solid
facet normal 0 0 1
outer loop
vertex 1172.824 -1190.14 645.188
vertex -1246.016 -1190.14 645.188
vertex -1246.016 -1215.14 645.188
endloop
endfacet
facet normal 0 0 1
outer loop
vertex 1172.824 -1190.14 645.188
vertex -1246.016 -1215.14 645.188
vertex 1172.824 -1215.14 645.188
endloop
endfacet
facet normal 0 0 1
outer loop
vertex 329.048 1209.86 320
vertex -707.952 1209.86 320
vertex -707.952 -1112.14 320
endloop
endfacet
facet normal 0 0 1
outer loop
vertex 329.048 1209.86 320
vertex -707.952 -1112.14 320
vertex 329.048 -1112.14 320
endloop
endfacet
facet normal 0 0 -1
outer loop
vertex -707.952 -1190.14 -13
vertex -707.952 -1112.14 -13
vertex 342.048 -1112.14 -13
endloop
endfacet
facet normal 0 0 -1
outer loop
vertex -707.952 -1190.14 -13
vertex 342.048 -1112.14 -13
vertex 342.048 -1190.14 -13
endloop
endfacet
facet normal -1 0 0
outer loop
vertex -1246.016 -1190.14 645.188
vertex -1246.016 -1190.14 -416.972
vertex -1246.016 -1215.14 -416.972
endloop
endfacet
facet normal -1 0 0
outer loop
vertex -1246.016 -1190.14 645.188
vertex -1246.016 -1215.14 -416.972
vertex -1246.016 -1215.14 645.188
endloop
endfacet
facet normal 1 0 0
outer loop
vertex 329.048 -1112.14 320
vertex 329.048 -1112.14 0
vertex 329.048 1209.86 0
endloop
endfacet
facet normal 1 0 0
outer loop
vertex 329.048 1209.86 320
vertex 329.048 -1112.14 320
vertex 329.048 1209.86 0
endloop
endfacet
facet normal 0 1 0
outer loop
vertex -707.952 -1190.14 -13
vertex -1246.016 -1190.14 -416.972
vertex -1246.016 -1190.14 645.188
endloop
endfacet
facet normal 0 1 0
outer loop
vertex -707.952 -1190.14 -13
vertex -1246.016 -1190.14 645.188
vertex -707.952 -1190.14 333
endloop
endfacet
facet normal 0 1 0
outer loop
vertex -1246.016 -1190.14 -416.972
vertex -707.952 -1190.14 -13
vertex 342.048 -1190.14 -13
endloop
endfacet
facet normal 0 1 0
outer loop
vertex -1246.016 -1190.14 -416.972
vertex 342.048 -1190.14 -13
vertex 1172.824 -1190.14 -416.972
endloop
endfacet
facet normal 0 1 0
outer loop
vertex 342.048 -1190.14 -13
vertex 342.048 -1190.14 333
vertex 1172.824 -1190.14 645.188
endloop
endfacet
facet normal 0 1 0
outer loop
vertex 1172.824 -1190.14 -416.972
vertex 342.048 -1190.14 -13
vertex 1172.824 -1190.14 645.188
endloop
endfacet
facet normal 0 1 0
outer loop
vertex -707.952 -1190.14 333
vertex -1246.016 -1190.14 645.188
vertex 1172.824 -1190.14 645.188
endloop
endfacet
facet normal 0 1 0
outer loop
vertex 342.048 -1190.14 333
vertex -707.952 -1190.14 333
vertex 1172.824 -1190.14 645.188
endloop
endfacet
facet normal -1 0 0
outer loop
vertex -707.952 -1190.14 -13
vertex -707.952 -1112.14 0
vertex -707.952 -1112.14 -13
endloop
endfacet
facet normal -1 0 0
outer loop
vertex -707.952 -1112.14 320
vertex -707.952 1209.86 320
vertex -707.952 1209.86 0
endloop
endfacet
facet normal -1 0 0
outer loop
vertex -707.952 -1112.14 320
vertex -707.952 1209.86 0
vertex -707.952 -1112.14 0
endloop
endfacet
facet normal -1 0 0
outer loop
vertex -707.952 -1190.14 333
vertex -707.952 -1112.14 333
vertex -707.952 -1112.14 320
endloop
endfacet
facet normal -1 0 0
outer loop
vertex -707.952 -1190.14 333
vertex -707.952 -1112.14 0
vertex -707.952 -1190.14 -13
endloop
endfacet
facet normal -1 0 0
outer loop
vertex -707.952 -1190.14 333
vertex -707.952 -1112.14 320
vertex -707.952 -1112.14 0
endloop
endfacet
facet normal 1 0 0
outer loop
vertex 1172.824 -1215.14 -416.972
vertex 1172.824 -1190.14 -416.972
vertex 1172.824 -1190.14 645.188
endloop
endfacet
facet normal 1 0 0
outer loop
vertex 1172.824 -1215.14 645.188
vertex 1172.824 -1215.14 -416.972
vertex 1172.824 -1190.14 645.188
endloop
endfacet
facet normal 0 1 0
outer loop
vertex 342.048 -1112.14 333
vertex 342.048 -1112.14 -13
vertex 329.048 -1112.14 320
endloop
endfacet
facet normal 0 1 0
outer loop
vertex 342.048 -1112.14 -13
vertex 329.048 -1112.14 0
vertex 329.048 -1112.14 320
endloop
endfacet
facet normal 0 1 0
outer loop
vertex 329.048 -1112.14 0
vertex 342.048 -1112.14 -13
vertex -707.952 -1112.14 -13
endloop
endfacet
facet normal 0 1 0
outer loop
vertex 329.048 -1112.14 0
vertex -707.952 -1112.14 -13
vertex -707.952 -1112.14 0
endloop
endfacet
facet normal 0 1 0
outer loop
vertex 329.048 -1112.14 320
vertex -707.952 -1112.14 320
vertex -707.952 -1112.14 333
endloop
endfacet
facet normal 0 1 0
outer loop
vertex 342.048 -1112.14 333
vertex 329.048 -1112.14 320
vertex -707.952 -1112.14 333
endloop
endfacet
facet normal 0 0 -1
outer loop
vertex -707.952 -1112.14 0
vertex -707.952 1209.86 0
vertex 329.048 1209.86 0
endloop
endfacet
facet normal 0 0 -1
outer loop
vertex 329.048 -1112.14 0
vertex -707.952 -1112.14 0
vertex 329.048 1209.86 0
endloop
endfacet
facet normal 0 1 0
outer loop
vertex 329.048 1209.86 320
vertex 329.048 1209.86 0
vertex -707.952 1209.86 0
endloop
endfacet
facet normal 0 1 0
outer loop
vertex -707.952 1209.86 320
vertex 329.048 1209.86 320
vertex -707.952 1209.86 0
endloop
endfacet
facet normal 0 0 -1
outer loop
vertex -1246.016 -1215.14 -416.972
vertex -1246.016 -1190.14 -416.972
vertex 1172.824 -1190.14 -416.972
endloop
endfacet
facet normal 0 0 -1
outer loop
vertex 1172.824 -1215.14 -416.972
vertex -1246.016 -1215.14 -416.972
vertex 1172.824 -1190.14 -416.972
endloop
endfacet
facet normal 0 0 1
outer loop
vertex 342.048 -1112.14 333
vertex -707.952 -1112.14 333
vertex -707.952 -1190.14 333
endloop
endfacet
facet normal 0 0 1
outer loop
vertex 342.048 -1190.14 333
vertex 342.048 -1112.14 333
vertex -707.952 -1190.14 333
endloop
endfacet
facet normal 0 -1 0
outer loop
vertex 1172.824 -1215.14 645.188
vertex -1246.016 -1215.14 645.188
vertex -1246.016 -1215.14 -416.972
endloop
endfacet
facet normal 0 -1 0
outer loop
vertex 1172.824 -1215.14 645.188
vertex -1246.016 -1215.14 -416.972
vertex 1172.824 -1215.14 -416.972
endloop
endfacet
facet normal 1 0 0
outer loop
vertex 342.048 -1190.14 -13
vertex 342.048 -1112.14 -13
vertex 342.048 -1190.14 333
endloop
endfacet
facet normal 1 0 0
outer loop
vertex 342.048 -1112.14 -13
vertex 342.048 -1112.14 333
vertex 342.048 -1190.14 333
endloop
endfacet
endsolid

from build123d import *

# Parameters (mm, degrees)
F1_DEPTH = 320
F2_W     = 78
F2_H     = 346
F3_DEPTH = 1050
F4_W     = 2418.8394546509
F4_H     = 1062.1602833271
F4_W_2   = 1050
F4_H_2   = 346
F5_DEPTH = 25


with BuildPart() as f1:
    # F0 (on Top) → F1 (new body)
    with BuildSketch(Plane.XY):
        Polygon((329.0476813504, 1209.8600632322), (-707.9523186496, 1209.8600632322), (-707.9523186496, -1190.1399367678), (342.0476813504, -1190.1399367678), (342.0476813504, -1112.1399367678), (329.0476813504, -1112.1399367678), align=None)
    extrude(amount=F1_DEPTH)

    # F2 (on face) → F3 (join, through all)
    with BuildSketch(Plane(origin=(-707.9523186496, 0, 0), x_dir=(0, -1, 0), z_dir=(-1, 0, 0))):
        with Locations((1151.1399367678, 160)):
            Rectangle(F2_W, F2_H)
    extrude(amount=-F3_DEPTH)

    # F4 (on face) → F5 (join)
    with BuildSketch(Plane.XZ.offset(1190.1399367678)):
        with Locations((-36.5958213806, 114.1081303358)):
            Rectangle(F4_W, F4_H)
        with Locations((-182.9523186496, 160)):
            Rectangle(F4_W_2, F4_H_2, mode=Mode.SUBTRACT)
        with Locations((-182.9523186496, 160)):
            Rectangle(F4_W_2, F4_H_2)
    extrude(amount=F5_DEPTH)


solid = f1.part
